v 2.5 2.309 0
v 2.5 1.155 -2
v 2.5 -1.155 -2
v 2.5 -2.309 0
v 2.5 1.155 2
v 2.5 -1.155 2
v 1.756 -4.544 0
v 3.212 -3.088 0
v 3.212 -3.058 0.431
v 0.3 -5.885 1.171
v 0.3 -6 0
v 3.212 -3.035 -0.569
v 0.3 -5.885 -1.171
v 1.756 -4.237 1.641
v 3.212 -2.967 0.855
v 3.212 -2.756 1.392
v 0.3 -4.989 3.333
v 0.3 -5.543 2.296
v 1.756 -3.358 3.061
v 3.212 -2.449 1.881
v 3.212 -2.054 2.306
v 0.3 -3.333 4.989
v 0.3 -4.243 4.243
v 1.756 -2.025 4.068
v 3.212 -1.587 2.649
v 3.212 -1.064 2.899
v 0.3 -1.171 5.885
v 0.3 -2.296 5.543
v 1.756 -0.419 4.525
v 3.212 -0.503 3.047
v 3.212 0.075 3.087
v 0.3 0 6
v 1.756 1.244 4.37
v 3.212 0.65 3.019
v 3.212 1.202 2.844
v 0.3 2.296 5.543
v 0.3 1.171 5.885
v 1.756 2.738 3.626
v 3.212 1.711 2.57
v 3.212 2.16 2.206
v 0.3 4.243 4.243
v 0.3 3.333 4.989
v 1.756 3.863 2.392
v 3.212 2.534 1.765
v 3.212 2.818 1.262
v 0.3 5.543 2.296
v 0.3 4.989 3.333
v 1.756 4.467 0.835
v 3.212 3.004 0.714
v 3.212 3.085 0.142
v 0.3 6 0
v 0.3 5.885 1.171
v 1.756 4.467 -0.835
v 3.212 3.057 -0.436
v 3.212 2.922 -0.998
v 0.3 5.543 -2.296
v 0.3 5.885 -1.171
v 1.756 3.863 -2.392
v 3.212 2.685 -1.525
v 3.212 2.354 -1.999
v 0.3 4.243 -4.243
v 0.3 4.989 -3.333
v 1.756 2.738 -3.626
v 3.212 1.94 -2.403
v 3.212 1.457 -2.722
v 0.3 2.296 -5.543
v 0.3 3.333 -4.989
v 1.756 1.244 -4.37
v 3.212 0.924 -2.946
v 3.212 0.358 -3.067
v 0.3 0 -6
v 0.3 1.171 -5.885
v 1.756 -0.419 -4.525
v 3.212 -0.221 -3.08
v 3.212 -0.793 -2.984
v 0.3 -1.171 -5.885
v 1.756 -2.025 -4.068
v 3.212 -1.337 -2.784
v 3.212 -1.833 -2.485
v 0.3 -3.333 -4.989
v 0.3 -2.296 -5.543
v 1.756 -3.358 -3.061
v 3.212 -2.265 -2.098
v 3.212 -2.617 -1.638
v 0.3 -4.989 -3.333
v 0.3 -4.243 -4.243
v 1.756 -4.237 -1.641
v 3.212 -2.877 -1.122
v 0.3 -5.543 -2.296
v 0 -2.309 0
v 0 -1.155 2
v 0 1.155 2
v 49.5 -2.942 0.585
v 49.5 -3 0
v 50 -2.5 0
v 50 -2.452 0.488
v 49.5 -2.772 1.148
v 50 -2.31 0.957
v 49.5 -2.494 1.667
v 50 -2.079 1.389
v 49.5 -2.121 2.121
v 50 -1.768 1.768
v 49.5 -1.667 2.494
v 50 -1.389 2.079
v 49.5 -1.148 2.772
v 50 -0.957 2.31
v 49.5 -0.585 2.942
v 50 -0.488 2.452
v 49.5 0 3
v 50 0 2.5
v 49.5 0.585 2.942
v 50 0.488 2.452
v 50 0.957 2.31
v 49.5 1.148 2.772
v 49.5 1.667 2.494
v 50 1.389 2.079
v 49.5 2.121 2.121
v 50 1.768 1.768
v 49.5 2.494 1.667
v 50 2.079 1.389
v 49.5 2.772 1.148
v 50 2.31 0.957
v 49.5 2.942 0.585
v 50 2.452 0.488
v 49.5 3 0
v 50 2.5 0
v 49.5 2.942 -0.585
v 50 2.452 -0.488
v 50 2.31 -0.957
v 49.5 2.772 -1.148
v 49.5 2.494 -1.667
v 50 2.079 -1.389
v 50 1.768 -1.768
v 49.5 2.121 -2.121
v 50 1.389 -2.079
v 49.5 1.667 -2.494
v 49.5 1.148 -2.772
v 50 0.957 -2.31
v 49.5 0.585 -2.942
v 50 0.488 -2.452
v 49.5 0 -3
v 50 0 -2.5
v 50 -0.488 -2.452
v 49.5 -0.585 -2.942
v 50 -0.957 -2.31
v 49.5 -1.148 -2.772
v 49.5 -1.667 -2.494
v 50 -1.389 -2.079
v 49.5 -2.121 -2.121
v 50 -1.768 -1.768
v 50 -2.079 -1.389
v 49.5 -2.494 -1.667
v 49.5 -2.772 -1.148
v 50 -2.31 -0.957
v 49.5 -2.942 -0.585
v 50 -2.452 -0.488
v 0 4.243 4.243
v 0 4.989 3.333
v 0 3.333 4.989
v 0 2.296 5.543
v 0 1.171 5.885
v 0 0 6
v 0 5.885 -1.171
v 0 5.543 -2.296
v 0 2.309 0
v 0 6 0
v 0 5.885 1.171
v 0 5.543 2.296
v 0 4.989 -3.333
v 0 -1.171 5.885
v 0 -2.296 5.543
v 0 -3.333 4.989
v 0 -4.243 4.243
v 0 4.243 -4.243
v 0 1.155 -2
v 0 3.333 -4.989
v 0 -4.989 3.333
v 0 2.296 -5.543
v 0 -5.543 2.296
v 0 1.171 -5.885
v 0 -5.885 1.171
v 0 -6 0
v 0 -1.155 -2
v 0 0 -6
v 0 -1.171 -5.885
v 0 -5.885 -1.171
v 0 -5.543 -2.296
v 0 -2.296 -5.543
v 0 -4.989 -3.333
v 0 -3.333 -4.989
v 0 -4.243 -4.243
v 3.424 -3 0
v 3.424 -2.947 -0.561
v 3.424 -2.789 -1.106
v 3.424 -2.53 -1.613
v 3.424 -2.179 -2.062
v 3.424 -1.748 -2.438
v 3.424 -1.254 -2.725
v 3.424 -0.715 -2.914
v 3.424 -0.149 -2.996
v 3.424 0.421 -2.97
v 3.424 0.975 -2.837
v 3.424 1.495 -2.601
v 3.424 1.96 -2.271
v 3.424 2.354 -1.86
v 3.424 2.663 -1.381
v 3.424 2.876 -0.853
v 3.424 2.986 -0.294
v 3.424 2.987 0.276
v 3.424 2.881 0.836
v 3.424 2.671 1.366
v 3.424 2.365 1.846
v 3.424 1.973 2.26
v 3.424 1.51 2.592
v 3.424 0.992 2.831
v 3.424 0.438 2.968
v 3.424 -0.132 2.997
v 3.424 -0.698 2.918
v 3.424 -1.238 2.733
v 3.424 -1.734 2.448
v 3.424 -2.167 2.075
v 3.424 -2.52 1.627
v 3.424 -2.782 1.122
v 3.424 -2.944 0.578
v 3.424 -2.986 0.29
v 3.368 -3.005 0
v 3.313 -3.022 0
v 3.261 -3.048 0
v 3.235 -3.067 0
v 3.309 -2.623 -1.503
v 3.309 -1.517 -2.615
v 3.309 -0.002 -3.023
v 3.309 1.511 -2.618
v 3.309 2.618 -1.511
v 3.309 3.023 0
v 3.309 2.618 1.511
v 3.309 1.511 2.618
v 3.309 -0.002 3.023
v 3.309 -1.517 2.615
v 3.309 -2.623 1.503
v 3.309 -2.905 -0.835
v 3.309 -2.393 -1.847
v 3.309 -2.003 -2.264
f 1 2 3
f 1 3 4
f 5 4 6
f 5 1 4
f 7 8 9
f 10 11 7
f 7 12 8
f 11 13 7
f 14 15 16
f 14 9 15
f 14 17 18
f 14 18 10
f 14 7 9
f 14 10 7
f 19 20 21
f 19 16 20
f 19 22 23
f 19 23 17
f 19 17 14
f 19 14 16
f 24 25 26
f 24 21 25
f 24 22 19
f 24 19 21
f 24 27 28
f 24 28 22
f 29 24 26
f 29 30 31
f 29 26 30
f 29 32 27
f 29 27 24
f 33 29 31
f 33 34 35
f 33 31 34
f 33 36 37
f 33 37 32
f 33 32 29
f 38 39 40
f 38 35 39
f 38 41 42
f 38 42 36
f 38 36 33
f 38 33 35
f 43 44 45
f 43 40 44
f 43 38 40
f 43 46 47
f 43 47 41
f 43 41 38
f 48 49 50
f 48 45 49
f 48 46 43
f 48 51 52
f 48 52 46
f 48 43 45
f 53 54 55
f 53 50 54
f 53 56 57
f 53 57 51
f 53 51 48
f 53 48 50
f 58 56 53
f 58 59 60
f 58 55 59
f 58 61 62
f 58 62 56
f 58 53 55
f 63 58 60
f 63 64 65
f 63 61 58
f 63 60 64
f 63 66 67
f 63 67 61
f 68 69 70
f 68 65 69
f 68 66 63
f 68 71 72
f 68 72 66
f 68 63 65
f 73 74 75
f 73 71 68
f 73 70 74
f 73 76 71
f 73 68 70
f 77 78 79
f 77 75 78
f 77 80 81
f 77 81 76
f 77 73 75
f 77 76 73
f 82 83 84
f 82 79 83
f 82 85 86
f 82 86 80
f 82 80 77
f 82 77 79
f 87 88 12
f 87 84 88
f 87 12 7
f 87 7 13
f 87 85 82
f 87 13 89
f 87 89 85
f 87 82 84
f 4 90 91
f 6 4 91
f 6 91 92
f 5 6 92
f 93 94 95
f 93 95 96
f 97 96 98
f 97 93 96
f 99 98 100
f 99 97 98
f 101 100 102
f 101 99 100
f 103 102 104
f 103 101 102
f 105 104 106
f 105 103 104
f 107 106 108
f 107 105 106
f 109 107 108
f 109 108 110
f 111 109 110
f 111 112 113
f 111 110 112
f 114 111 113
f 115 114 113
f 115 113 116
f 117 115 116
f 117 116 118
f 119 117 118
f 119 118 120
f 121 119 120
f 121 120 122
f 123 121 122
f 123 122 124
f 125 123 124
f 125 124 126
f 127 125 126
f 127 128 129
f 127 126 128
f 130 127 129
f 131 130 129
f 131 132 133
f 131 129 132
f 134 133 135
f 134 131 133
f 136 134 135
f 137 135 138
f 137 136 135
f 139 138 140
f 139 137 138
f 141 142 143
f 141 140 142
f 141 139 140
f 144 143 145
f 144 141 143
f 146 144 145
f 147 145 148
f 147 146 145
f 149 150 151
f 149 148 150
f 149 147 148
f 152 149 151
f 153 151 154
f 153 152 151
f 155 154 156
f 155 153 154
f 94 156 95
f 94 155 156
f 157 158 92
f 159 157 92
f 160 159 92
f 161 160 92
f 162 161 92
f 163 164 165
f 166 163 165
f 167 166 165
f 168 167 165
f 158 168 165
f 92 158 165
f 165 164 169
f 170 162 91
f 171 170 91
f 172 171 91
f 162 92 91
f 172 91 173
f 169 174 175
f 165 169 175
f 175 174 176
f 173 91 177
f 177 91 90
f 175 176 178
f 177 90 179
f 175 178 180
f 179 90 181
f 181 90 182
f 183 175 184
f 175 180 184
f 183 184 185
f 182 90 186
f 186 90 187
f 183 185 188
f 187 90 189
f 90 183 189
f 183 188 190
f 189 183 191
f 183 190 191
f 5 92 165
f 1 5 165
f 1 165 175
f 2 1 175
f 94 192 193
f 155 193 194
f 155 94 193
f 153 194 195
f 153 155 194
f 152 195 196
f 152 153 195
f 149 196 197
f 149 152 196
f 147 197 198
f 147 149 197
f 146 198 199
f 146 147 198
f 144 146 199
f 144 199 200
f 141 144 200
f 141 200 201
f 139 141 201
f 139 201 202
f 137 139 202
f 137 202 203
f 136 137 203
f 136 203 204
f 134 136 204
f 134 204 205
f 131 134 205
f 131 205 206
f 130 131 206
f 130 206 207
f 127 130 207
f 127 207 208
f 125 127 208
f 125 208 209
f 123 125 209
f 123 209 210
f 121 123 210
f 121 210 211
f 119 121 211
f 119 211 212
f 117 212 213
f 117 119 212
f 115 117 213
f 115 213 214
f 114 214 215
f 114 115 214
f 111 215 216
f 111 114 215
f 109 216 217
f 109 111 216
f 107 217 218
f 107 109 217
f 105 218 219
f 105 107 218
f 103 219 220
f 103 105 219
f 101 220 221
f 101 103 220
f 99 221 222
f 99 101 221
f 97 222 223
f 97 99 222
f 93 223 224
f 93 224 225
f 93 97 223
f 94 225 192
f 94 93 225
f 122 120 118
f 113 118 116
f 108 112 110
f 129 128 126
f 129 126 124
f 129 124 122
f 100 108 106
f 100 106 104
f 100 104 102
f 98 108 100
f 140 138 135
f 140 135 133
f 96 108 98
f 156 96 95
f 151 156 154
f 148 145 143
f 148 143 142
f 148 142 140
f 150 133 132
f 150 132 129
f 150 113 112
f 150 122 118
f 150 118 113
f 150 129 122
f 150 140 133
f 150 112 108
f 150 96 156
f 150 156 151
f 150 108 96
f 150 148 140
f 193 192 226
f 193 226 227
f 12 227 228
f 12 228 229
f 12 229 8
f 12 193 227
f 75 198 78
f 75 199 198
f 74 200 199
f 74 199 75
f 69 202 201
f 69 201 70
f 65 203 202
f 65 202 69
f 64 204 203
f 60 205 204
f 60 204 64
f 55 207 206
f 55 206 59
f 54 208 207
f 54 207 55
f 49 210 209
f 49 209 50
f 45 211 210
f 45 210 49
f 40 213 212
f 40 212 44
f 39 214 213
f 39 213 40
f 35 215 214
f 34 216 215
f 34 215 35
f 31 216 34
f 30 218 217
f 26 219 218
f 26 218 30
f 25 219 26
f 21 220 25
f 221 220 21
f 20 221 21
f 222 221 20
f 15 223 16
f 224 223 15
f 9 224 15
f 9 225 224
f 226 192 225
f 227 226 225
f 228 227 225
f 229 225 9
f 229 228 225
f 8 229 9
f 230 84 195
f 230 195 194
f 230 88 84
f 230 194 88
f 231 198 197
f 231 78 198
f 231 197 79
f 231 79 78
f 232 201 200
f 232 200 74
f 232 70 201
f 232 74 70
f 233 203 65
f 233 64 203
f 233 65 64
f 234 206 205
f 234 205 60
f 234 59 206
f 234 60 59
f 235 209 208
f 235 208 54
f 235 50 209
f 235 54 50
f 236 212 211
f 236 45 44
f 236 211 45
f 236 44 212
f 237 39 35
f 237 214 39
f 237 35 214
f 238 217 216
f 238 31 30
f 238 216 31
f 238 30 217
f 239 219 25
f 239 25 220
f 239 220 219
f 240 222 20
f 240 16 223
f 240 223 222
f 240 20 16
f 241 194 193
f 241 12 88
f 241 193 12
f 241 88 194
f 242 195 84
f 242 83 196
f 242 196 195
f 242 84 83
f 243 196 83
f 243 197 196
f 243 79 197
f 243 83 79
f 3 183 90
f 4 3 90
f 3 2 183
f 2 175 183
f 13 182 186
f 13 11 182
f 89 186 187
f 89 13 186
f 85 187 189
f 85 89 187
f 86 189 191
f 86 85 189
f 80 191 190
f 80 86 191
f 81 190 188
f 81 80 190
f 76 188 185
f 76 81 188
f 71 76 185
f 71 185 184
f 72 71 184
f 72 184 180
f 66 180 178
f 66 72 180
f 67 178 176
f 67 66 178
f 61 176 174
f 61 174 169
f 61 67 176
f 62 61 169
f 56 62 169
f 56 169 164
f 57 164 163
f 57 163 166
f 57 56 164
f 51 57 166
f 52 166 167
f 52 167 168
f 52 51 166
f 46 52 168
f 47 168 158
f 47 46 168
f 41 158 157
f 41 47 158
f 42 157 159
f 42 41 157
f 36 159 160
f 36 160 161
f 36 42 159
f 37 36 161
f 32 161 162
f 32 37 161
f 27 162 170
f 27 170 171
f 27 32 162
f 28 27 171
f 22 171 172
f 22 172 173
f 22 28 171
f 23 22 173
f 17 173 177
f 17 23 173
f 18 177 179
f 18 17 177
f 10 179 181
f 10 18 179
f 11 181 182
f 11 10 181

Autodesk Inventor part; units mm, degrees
ref_plane "YZ Plane" through (0, 0, 0) normal (1, 0, 0) x (0, 1, 0)
sketch "Skizze1" plane through (0, 0, 0) normal (0, 1, 0) x (-1, 0, 0)
  point P0 (0, 0)
sketch "Skizze2" plane through (0, 0, 0) normal (0, 0, 1) x (-1, 0, 0)
  line L0 (-50, 3) -> (-50, 0)
  line L1 (-3.3, 3) -> (-50, 3)
  line L2 (-0.3, 6) -> (-3.3, 3)
  line L3 (0, 6) -> (-0.3, 6)
  line L4 (0, 0) -> (0, 6)
  line L5 (-50, 0) -> (0, 0)
  line L6 (-50, 0) -> (0, 0)
  line L7 (0, -9.6) -> (0, 1.6) projected
  line L8 (10, 0) -> (-60, 0) projected
  dimension "ParC" = 0.3
  dimension "d43" = 45
  dimension "d44" = 6
  dimension "d45" = 3
  dimension "d46" = 50
  dimension "d47" = 0
  dimension "d48" = 0
revolve "Drehung1" add sketch "Skizze2" angle 360 about axis through (50, 0, 0) along (1, 0, 0)
sketch "Skizze3" plane through (0, 0, 0) normal (-1, 0, 0) x (0, 0, 1)
  line L0 (-2, 1.1547) -> (-2, -1.1547)
  line L1 (0, 2.3094) -> (-2, 1.1547)
  line L2 (2, 1.1547) -> (0, 2.3094)
  line L3 (2, -1.1547) -> (2, 1.1547)
  line L4 (0, -2.3094) -> (2, -1.1547)
  line L5 (-2, -1.1547) -> (0, -2.3094)
  circle A0 centre (0, 0) radius 2 construction
  circle A1 centre (0, 0) radius 3 construction
  dimension "d11" = 4
  dimension "d13" = 120
  dimension "d15" = 120
extrude "Extrusion1" cut sketch "Skizze3" against normal blind 2.5
fillet "Rundung1" radius 0.3 1 edges at (3.3, 3, 0)
chamfer "Fase1" distance 0.5 angle 45 1 edges at (50, 3, 0) measured on face at (34.4748, -2.4612, -1.7154)
thread "Gewinde1" size "M6x1" class "6g" standard "ISO Metric profile" length 18
ref_plane "MSC_PF1" through (0, 0, 0) normal (1, 0, 0) x (0, 1, 0)
ref_plane "MSC_PT1" through (0, 0, 0) normal (1, 0, 0) x (0, 1, 0)
equation "\"d43\" = 0.5 * ang"
equation "\"d44\" = 0.5 * dk"
equation "\"d45\" = 0.5 * NND"
equation "\"d46\" = NLG"
equation "\"d11\" = ParS"
equation "\"d16\" = ParT"
equation "\"d18\" = r"
equation "\"d19\" = 0.5 * PTC"
equation "\"d39\" = 0.5 * PTC"
equation "\"NND\" = 6"
equation "\"PTC\" = 1"
equation "\"dk\" = 12"
equation "\"ParK\" = 3.3"
equation "\"ParS\" = 4"
equation "\"ParT\" = 2.5"
equation "\"r\" = 0.3"
equation "\"NLG\" = 50"
equation "\"ang\" = 90deg"
equation "\"THREADDIA\" = NND"
properties part number "ISO 10642 - M6 x  50" material "Stahl"
